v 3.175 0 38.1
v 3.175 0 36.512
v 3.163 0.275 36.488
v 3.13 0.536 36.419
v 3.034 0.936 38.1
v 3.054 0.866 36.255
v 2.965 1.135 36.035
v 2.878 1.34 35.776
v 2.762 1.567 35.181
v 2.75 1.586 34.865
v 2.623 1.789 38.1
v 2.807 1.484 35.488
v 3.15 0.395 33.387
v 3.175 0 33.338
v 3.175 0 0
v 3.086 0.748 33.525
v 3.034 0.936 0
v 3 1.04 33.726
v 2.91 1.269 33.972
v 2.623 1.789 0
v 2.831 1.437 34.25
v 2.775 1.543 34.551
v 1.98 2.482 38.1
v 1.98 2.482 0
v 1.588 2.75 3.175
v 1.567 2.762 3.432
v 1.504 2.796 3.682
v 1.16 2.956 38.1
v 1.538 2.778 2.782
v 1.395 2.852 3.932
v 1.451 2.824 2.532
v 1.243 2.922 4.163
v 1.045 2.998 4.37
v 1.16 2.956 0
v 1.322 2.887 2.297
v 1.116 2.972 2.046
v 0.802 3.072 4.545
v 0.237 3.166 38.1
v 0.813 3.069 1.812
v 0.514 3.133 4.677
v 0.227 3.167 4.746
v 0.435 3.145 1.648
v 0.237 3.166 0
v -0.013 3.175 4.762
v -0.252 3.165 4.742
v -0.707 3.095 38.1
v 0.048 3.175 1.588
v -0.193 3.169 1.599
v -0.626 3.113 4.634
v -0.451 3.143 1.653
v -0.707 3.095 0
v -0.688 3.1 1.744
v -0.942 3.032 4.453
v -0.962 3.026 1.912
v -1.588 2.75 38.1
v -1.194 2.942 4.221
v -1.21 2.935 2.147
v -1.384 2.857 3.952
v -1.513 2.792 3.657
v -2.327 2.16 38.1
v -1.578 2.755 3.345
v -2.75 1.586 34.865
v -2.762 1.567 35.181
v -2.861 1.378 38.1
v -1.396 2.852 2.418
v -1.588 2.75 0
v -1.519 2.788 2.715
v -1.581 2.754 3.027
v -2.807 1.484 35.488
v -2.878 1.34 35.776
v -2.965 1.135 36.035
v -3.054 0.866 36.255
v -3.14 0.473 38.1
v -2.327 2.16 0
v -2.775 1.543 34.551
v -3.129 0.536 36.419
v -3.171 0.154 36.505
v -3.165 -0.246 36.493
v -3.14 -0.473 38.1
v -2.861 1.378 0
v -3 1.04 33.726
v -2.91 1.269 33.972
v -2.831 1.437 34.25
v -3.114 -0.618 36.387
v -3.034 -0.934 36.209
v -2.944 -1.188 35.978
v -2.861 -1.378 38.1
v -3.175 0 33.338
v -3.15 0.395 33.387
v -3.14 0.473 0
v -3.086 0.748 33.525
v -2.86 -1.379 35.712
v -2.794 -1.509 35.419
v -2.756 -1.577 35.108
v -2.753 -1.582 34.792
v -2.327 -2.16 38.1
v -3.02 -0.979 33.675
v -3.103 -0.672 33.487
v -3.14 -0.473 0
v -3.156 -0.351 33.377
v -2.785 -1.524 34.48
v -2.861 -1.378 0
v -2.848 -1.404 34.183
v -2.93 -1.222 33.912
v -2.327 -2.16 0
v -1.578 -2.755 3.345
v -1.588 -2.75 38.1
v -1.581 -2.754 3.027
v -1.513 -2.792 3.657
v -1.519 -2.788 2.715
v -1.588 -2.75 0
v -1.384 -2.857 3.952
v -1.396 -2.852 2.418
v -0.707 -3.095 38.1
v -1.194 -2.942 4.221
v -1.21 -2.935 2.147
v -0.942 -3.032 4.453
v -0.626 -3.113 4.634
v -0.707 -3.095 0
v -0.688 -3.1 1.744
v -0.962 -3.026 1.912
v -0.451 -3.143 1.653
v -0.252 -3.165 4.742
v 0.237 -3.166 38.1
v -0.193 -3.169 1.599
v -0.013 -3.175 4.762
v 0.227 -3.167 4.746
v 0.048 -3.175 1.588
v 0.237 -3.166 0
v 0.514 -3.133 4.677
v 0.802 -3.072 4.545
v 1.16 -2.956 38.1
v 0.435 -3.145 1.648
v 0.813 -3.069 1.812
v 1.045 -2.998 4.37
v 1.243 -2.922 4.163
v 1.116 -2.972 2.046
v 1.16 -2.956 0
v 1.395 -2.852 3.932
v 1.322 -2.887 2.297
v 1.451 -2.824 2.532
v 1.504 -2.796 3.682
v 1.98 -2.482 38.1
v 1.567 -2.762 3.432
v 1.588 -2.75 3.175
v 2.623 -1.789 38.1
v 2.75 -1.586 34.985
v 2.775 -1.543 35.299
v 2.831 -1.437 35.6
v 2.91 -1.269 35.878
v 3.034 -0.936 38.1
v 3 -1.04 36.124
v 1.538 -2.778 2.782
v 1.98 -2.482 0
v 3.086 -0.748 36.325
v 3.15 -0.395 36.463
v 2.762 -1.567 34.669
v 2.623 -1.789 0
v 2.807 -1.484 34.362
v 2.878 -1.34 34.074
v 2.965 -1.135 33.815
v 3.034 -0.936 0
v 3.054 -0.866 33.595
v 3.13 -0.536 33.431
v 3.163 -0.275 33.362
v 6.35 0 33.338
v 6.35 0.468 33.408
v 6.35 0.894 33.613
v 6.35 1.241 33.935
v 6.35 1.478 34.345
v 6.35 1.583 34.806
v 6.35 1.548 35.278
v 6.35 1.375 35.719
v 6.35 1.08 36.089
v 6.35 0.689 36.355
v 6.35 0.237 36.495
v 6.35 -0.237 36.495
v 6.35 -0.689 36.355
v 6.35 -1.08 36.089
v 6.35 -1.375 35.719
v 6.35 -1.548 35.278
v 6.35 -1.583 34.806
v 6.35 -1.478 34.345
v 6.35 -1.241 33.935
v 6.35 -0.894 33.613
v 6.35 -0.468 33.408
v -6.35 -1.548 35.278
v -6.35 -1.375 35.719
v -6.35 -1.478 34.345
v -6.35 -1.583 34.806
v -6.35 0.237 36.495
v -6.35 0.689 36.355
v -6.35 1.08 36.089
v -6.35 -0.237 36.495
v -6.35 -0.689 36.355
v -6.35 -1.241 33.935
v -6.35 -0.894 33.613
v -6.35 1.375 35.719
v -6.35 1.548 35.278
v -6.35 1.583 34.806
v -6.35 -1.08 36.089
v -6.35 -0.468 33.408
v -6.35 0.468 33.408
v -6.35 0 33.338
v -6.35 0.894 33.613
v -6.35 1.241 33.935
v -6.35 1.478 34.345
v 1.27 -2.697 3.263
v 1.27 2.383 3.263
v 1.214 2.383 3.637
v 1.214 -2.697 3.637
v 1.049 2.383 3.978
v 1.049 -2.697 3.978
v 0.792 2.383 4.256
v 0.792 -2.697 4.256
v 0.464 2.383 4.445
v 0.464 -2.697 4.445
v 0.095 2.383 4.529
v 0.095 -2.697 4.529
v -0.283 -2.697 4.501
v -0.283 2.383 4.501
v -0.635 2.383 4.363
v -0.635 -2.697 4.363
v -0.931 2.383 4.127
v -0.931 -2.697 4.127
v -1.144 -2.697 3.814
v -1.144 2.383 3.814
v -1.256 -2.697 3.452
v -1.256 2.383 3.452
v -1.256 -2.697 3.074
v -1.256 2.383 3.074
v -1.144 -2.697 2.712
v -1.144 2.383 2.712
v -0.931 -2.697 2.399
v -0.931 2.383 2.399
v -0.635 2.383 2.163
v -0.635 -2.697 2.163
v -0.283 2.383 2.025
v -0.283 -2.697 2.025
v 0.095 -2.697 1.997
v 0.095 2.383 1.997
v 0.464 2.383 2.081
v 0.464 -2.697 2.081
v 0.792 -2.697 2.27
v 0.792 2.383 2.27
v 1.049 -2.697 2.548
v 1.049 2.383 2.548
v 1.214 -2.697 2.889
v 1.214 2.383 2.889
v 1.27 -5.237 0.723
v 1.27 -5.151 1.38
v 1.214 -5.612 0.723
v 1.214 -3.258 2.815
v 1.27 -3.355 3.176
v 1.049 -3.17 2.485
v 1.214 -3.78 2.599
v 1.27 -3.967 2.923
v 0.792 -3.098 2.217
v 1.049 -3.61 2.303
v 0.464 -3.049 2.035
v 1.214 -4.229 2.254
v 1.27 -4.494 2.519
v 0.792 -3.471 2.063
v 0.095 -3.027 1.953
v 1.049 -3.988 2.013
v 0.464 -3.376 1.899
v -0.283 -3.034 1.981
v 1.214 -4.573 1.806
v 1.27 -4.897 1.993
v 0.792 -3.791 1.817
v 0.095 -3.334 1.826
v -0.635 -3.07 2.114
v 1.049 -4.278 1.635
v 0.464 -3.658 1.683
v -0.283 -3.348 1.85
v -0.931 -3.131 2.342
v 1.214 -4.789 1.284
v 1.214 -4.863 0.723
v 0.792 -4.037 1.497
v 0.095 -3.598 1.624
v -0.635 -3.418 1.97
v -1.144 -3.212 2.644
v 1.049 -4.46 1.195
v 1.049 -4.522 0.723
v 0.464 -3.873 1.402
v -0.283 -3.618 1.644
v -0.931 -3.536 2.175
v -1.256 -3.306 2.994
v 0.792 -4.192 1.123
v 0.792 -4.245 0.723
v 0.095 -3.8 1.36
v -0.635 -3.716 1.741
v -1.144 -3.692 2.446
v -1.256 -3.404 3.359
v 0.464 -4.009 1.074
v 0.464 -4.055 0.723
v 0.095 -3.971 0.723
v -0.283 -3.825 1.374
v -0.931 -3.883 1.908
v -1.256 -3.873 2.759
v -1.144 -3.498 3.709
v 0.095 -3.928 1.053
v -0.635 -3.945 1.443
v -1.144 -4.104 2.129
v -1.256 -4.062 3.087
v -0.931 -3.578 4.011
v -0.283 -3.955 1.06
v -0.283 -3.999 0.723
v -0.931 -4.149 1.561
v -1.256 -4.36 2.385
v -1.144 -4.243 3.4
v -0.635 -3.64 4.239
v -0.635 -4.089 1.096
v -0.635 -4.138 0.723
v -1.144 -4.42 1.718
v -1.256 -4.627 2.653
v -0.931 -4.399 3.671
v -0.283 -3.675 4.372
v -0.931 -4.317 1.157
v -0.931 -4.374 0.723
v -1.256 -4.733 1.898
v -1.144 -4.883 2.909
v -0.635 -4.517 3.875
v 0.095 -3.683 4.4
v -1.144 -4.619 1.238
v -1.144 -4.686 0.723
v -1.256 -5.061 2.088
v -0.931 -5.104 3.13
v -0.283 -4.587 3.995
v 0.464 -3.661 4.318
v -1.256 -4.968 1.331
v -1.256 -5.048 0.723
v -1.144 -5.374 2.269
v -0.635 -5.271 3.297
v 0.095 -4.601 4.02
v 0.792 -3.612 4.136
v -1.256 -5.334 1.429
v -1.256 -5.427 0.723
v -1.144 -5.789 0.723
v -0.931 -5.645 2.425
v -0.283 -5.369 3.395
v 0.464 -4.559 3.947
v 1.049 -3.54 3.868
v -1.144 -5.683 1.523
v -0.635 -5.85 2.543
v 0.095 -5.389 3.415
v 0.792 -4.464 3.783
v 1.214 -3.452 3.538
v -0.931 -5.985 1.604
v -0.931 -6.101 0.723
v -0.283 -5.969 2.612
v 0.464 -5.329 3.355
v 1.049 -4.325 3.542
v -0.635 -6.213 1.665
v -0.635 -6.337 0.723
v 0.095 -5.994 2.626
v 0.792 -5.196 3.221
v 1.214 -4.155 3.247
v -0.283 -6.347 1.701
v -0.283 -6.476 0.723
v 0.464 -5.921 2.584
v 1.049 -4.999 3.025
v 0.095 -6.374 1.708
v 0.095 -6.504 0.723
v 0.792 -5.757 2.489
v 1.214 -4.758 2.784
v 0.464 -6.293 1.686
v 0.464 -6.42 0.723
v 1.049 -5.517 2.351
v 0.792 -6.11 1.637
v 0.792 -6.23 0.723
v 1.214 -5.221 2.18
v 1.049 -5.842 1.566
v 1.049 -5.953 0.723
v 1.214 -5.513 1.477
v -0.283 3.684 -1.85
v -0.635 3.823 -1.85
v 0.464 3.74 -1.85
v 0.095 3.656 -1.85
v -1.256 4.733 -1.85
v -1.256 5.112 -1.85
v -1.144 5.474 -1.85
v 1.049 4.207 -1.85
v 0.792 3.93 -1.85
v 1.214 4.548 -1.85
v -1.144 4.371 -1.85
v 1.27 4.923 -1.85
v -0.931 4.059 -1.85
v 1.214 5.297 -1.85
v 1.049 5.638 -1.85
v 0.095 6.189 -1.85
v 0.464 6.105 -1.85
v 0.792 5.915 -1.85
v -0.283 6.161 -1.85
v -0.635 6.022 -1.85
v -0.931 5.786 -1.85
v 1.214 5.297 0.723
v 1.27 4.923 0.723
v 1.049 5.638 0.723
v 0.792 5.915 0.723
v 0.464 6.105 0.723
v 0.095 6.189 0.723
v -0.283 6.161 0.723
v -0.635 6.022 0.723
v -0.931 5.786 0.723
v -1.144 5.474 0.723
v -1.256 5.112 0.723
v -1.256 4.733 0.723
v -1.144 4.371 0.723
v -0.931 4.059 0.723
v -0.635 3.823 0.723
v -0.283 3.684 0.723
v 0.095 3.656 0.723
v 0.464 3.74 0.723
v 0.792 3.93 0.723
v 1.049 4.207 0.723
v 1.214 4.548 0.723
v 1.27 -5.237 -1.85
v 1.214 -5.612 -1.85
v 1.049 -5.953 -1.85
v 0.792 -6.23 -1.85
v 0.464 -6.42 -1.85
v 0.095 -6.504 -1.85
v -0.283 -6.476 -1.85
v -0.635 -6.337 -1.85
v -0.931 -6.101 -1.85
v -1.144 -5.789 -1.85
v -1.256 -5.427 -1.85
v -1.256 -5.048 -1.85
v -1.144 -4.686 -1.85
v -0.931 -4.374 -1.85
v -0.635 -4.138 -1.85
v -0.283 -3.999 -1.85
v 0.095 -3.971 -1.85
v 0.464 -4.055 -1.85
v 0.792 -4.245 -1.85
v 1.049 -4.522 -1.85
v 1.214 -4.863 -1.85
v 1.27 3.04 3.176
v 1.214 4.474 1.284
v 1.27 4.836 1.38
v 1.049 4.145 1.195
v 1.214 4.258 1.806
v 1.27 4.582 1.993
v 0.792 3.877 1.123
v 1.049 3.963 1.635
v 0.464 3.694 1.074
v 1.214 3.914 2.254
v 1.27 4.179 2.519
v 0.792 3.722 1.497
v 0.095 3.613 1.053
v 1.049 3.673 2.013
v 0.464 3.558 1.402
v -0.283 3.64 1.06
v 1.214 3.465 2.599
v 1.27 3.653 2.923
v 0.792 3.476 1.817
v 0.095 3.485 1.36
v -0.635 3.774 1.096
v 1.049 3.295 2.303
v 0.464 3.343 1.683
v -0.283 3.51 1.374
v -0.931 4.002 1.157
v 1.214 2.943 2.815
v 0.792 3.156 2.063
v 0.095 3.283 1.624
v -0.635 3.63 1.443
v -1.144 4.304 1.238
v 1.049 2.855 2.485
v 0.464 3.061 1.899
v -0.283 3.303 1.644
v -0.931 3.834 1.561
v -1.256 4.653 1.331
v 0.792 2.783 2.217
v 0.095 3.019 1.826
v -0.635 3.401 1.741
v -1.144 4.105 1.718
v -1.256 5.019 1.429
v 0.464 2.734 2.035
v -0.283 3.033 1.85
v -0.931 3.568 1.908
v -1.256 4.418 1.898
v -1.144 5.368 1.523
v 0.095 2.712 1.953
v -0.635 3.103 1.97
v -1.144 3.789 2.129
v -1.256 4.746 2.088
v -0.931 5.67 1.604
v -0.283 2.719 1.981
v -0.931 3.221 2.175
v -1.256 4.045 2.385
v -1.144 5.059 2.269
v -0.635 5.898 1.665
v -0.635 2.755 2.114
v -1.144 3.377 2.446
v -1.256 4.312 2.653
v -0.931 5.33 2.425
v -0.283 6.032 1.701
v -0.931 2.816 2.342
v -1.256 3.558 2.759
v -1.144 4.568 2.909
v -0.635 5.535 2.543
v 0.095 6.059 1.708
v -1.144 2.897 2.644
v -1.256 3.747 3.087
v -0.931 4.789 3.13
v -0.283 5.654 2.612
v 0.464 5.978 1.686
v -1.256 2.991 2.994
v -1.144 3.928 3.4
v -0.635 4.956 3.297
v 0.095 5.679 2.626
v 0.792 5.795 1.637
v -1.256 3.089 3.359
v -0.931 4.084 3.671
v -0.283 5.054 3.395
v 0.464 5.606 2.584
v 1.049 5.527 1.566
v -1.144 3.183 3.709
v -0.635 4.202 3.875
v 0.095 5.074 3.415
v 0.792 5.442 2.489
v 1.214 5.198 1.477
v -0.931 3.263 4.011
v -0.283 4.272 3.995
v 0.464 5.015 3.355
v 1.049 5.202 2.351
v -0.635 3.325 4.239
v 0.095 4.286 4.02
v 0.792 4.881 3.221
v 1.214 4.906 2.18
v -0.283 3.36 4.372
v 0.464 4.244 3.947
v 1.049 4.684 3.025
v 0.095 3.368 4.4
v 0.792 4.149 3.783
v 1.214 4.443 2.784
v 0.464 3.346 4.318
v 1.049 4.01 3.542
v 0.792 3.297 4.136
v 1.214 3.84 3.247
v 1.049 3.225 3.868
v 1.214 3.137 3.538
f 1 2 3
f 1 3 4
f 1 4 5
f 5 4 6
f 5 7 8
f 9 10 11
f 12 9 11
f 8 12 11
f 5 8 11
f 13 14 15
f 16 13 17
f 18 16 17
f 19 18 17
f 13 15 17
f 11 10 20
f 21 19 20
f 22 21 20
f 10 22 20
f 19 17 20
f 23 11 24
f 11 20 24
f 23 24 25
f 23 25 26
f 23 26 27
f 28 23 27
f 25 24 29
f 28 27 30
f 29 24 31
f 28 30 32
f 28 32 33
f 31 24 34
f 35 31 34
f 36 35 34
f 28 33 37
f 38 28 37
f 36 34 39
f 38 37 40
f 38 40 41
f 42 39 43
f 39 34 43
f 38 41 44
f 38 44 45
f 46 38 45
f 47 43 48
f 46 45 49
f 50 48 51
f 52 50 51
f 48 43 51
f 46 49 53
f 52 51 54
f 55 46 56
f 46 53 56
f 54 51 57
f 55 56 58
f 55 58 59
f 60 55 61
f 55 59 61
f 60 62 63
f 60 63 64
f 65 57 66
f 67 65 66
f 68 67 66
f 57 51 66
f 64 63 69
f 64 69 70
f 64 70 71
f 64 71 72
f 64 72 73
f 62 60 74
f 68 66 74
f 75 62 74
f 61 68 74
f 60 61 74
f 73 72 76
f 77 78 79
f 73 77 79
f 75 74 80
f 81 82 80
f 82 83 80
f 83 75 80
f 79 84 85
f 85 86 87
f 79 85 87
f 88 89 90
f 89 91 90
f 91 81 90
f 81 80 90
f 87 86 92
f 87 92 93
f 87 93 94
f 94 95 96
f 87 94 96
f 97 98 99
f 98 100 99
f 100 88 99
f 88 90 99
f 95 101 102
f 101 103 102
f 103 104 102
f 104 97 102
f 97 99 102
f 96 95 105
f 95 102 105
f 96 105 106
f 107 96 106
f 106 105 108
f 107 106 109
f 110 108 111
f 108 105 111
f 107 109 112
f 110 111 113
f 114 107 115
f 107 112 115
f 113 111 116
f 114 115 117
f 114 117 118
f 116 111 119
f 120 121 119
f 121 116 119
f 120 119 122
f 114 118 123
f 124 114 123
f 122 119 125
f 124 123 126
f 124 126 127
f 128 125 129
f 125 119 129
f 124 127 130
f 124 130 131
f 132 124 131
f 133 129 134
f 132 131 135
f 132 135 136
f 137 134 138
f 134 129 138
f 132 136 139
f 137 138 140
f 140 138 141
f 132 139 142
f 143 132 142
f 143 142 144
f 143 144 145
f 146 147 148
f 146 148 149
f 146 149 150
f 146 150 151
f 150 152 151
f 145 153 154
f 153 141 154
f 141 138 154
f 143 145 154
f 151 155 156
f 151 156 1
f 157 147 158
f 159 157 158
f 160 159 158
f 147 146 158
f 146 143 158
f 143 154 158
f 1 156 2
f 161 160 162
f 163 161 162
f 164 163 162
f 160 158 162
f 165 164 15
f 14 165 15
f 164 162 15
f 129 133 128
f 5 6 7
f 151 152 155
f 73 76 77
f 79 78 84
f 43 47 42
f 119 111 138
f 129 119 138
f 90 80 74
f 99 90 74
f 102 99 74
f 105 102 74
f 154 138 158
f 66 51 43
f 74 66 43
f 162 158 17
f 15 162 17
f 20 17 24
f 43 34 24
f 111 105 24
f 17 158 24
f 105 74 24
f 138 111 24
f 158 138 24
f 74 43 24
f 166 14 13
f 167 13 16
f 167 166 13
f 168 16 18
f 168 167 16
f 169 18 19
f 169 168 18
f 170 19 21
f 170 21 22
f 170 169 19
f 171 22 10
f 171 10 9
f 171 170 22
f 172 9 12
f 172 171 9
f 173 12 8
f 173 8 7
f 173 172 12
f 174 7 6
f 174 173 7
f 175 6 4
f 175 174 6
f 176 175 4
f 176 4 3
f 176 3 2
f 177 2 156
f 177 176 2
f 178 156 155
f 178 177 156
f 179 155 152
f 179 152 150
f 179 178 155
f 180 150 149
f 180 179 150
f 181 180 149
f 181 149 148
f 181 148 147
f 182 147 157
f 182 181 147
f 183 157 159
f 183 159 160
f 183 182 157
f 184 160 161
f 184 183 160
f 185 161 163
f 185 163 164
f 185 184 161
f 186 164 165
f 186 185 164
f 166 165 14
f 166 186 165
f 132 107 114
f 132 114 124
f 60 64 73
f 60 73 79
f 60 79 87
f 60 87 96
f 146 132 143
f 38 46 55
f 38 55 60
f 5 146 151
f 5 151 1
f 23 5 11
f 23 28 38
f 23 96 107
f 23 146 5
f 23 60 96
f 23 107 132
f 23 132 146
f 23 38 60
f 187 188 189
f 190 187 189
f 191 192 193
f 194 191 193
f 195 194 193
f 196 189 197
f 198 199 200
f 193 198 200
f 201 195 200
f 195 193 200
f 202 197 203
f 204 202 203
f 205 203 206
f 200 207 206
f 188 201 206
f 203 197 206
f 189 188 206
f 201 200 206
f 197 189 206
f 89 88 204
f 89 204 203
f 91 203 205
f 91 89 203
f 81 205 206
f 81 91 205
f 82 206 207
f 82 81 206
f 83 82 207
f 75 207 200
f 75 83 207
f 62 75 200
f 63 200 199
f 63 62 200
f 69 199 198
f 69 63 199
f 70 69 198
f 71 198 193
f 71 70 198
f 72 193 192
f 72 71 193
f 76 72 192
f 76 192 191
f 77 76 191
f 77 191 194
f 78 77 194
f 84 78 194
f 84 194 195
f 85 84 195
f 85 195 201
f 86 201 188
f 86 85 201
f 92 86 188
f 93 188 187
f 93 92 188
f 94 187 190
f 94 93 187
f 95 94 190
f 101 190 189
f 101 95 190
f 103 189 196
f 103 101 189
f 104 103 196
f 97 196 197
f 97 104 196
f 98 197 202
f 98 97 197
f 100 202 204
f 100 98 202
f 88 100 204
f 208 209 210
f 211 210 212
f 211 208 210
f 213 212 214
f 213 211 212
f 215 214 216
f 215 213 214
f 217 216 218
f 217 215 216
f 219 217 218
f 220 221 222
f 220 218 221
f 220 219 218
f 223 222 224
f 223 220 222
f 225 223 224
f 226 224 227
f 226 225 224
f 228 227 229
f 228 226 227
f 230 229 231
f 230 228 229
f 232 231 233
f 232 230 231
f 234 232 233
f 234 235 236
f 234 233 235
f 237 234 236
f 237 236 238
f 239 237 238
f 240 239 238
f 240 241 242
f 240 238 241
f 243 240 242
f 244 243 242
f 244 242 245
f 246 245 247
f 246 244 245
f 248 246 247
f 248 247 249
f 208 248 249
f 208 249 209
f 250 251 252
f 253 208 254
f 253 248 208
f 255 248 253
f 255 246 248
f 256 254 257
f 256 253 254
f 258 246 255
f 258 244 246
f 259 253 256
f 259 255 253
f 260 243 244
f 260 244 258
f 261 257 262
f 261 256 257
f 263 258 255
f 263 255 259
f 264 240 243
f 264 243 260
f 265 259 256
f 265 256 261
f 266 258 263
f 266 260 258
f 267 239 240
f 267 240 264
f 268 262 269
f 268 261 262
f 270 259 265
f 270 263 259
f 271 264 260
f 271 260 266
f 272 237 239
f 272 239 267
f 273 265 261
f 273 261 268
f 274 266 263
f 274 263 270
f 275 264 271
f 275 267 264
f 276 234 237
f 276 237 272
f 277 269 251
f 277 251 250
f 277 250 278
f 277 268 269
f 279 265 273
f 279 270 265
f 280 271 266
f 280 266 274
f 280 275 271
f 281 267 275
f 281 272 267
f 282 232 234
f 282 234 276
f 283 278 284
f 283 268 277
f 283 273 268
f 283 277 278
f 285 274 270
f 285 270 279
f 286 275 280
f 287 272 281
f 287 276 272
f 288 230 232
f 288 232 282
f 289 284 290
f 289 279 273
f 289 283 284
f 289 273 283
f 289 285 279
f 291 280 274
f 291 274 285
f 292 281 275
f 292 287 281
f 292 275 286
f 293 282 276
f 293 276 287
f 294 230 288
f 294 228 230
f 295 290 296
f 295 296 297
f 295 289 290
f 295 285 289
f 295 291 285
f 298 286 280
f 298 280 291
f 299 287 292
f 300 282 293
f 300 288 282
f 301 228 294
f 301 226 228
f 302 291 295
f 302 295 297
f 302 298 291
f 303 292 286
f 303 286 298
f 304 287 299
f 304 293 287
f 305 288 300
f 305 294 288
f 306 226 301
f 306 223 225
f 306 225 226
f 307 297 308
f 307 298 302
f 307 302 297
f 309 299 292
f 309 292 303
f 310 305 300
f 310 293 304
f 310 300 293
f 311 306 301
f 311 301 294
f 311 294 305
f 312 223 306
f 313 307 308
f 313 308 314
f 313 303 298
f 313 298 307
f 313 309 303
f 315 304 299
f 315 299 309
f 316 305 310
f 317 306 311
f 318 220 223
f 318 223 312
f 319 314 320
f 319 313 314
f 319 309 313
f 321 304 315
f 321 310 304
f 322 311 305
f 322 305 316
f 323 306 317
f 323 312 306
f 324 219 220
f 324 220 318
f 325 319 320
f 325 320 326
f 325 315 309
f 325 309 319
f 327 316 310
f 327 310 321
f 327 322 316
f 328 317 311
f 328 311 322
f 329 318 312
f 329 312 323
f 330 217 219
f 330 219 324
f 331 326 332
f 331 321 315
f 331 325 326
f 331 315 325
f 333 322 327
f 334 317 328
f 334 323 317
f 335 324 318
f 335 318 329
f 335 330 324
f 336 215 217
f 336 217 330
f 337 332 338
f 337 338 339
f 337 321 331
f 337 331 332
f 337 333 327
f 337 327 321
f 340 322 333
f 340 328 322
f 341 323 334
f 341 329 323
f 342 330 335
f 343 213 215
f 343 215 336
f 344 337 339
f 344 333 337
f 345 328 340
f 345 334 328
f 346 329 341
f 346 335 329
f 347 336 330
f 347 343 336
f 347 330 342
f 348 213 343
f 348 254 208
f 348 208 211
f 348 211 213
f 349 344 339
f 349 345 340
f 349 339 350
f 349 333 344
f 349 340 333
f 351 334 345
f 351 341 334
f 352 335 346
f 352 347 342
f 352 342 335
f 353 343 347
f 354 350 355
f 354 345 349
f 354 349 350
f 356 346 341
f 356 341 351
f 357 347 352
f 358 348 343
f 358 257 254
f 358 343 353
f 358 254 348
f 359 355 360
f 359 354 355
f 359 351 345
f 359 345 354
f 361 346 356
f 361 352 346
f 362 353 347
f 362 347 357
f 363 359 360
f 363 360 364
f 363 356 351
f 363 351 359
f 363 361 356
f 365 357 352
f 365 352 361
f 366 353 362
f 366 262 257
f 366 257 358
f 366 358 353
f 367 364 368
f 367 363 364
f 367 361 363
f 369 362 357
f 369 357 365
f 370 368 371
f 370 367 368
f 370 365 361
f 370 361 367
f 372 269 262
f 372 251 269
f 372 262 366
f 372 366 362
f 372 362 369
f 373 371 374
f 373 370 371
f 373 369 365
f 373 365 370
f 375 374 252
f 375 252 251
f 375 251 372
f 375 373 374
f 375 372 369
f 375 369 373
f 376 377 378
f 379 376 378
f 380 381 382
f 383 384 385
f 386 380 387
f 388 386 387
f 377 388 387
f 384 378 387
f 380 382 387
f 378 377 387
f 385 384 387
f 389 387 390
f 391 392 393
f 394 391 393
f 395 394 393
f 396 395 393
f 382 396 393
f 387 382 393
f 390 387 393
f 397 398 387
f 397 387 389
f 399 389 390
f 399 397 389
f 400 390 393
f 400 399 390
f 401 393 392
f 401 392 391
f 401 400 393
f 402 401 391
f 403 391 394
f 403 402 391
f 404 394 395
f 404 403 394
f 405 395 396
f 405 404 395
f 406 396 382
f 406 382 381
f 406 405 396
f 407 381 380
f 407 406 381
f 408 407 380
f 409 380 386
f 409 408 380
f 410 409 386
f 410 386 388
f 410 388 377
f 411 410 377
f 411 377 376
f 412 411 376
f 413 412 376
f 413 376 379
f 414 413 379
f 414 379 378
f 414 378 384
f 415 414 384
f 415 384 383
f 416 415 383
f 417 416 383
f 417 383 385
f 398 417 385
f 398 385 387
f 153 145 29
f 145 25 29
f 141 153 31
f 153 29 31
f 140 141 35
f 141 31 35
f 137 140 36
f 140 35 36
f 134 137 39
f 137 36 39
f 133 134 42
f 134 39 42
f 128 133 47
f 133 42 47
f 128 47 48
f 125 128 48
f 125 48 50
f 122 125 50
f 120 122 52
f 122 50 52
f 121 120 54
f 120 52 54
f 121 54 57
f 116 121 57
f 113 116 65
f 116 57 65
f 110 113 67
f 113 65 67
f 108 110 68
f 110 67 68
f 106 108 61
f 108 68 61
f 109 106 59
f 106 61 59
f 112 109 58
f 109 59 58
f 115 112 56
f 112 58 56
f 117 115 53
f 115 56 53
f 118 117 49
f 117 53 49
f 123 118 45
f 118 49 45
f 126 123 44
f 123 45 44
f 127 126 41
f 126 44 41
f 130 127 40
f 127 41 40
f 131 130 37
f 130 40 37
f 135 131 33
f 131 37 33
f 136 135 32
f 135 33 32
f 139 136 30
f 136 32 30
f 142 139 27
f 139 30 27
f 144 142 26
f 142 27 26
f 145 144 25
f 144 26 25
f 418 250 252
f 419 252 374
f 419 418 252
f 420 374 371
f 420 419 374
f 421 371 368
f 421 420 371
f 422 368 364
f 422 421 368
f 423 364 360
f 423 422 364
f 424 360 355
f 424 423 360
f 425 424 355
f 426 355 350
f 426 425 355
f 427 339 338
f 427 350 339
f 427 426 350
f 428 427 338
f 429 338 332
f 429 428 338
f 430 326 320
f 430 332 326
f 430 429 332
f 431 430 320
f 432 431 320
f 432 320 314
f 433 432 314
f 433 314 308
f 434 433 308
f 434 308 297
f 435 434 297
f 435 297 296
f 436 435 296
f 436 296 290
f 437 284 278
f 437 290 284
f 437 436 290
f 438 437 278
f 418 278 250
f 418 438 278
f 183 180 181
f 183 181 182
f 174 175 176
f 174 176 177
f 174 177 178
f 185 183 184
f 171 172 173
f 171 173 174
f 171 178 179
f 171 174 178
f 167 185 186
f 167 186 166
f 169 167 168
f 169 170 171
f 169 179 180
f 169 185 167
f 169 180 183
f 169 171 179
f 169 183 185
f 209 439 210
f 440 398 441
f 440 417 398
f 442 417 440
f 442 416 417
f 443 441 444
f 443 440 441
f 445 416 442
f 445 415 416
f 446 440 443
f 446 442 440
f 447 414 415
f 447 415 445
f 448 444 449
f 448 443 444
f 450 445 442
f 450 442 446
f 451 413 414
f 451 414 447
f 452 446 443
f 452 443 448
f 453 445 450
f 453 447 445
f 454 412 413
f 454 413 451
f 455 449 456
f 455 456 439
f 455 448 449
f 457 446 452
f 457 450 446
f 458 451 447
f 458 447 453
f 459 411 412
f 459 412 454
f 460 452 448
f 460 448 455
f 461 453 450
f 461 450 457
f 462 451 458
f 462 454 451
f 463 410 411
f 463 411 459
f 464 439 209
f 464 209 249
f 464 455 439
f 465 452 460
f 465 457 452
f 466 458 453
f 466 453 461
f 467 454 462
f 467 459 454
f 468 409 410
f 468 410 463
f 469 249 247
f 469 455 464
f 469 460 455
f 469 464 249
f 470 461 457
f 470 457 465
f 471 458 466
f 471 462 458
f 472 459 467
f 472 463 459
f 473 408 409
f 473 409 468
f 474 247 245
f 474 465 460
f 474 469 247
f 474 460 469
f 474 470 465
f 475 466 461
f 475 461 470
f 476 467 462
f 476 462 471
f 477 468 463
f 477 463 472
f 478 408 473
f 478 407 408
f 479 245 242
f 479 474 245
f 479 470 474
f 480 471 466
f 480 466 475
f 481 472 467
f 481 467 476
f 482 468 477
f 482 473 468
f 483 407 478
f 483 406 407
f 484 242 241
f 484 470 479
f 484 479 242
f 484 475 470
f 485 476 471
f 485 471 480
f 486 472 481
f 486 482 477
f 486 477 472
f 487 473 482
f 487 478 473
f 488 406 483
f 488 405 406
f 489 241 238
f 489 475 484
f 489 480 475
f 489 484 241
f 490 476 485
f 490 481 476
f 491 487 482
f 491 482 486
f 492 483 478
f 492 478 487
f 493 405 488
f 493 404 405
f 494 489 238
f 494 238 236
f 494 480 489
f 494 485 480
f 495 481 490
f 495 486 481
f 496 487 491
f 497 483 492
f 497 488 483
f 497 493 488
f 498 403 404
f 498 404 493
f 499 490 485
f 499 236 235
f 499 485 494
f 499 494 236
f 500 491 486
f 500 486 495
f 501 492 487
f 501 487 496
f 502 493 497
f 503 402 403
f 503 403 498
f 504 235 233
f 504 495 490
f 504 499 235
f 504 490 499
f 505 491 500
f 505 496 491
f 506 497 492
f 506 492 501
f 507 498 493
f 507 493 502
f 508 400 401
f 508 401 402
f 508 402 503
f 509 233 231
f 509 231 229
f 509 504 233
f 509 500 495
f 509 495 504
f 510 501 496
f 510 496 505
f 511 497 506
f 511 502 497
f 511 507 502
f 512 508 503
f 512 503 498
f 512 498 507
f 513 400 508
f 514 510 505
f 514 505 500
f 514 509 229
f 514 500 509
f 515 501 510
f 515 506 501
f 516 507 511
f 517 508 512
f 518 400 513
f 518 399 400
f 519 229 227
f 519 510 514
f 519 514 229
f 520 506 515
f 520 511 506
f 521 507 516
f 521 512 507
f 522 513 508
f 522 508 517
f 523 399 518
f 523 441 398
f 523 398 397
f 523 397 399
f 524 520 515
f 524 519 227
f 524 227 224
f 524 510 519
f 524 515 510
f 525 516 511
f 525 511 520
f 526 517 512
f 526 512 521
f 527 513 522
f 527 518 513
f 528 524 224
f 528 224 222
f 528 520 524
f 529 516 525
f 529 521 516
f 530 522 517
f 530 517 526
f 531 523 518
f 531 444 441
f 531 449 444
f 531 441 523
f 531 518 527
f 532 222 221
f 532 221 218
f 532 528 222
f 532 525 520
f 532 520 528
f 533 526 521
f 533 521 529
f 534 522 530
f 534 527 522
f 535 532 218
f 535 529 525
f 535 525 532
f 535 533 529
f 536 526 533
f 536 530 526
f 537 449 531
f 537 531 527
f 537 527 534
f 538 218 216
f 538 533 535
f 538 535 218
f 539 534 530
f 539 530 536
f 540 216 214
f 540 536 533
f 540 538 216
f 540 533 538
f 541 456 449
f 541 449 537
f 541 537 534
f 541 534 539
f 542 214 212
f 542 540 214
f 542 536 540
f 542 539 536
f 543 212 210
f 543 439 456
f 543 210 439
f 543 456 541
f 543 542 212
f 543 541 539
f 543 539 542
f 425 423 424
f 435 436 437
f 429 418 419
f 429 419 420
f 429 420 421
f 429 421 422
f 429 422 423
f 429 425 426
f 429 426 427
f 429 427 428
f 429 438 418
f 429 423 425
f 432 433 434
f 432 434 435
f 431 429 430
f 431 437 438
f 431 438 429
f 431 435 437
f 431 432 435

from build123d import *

# Parameters (mm, degrees)
SKETCH1_R           = 3.175
BOSS_EXTRUDE1_DEPTH = 38.1
SKETCH2_R           = 1.5875
CUT_EXTRUDE1_DEPTH  = 15.875
SKETCH3_R           = 1.5875
BOSS_EXTRUDE2_DEPTH = 6.35
SWEEP1_PROFILE_R    = 1.27


with BuildPart() as part:
    # Sketch1 → Boss-Extrude1 (new body)
    with BuildSketch(Plane.XY):
        Circle(SKETCH1_R)
    extrude(amount=BOSS_EXTRUDE1_DEPTH)

    # Sketch2 → Cut-Extrude1 (cut, symmetric)
    with BuildSketch(Plane(origin=(0, 0, 0), x_dir=(1, 0, 0), z_dir=(0, 1, 0))):
        with Locations((0, -3.175)):
            Circle(SKETCH2_R)
    extrude(amount=CUT_EXTRUDE1_DEPTH, both=True, mode=Mode.SUBTRACT)

    # Sketch3 → Boss-Extrude2 (add, symmetric)
    with BuildSketch(Plane(origin=(0, 0, 0), x_dir=(0, 0, -1), z_dir=(1, 0, 0))):
        with Locations((-34.925, 0)):
            Circle(SKETCH3_R)
    extrude(amount=BOSS_EXTRUDE2_DEPTH, both=True)


with BuildPart() as body_2:
    # Sweep1: sweep along a path in Sketch4
    with BuildLine(Plane(origin=(0, 0, 0), x_dir=(0, 0, -1), z_dir=(1, 0, 0))) as sweep1_path:
        Line((1.85035109, 4.922501093), (-0.723036469, 4.922501093))
        ThreePointArc((-0.723036469, 4.922501093), (-2.519087693, 4.178552317), (-3.263036469, 2.382501093))
        Line((-3.263036469, 2.382501093), (-3.263036469, -2.697498907))
        ThreePointArc((-3.263036469, -2.697498907), (-2.519087693, -4.493550132), (-0.723036469, -5.237498907))
        Line((-0.723036469, -5.237498907), (1.85035109, -5.237498907))
    # Sweep1 profile (on start of the path) → Sweep1 (sweep)
    with BuildSketch(Plane(origin=(0, 4.922501093, -1.85035109), x_dir=(1, 0, 0), z_dir=(0, 0, 1))):
        Circle(SWEEP1_PROFILE_R)
    sweep(path=sweep1_path.line)


solid = Compound([part.part, body_2.part])
